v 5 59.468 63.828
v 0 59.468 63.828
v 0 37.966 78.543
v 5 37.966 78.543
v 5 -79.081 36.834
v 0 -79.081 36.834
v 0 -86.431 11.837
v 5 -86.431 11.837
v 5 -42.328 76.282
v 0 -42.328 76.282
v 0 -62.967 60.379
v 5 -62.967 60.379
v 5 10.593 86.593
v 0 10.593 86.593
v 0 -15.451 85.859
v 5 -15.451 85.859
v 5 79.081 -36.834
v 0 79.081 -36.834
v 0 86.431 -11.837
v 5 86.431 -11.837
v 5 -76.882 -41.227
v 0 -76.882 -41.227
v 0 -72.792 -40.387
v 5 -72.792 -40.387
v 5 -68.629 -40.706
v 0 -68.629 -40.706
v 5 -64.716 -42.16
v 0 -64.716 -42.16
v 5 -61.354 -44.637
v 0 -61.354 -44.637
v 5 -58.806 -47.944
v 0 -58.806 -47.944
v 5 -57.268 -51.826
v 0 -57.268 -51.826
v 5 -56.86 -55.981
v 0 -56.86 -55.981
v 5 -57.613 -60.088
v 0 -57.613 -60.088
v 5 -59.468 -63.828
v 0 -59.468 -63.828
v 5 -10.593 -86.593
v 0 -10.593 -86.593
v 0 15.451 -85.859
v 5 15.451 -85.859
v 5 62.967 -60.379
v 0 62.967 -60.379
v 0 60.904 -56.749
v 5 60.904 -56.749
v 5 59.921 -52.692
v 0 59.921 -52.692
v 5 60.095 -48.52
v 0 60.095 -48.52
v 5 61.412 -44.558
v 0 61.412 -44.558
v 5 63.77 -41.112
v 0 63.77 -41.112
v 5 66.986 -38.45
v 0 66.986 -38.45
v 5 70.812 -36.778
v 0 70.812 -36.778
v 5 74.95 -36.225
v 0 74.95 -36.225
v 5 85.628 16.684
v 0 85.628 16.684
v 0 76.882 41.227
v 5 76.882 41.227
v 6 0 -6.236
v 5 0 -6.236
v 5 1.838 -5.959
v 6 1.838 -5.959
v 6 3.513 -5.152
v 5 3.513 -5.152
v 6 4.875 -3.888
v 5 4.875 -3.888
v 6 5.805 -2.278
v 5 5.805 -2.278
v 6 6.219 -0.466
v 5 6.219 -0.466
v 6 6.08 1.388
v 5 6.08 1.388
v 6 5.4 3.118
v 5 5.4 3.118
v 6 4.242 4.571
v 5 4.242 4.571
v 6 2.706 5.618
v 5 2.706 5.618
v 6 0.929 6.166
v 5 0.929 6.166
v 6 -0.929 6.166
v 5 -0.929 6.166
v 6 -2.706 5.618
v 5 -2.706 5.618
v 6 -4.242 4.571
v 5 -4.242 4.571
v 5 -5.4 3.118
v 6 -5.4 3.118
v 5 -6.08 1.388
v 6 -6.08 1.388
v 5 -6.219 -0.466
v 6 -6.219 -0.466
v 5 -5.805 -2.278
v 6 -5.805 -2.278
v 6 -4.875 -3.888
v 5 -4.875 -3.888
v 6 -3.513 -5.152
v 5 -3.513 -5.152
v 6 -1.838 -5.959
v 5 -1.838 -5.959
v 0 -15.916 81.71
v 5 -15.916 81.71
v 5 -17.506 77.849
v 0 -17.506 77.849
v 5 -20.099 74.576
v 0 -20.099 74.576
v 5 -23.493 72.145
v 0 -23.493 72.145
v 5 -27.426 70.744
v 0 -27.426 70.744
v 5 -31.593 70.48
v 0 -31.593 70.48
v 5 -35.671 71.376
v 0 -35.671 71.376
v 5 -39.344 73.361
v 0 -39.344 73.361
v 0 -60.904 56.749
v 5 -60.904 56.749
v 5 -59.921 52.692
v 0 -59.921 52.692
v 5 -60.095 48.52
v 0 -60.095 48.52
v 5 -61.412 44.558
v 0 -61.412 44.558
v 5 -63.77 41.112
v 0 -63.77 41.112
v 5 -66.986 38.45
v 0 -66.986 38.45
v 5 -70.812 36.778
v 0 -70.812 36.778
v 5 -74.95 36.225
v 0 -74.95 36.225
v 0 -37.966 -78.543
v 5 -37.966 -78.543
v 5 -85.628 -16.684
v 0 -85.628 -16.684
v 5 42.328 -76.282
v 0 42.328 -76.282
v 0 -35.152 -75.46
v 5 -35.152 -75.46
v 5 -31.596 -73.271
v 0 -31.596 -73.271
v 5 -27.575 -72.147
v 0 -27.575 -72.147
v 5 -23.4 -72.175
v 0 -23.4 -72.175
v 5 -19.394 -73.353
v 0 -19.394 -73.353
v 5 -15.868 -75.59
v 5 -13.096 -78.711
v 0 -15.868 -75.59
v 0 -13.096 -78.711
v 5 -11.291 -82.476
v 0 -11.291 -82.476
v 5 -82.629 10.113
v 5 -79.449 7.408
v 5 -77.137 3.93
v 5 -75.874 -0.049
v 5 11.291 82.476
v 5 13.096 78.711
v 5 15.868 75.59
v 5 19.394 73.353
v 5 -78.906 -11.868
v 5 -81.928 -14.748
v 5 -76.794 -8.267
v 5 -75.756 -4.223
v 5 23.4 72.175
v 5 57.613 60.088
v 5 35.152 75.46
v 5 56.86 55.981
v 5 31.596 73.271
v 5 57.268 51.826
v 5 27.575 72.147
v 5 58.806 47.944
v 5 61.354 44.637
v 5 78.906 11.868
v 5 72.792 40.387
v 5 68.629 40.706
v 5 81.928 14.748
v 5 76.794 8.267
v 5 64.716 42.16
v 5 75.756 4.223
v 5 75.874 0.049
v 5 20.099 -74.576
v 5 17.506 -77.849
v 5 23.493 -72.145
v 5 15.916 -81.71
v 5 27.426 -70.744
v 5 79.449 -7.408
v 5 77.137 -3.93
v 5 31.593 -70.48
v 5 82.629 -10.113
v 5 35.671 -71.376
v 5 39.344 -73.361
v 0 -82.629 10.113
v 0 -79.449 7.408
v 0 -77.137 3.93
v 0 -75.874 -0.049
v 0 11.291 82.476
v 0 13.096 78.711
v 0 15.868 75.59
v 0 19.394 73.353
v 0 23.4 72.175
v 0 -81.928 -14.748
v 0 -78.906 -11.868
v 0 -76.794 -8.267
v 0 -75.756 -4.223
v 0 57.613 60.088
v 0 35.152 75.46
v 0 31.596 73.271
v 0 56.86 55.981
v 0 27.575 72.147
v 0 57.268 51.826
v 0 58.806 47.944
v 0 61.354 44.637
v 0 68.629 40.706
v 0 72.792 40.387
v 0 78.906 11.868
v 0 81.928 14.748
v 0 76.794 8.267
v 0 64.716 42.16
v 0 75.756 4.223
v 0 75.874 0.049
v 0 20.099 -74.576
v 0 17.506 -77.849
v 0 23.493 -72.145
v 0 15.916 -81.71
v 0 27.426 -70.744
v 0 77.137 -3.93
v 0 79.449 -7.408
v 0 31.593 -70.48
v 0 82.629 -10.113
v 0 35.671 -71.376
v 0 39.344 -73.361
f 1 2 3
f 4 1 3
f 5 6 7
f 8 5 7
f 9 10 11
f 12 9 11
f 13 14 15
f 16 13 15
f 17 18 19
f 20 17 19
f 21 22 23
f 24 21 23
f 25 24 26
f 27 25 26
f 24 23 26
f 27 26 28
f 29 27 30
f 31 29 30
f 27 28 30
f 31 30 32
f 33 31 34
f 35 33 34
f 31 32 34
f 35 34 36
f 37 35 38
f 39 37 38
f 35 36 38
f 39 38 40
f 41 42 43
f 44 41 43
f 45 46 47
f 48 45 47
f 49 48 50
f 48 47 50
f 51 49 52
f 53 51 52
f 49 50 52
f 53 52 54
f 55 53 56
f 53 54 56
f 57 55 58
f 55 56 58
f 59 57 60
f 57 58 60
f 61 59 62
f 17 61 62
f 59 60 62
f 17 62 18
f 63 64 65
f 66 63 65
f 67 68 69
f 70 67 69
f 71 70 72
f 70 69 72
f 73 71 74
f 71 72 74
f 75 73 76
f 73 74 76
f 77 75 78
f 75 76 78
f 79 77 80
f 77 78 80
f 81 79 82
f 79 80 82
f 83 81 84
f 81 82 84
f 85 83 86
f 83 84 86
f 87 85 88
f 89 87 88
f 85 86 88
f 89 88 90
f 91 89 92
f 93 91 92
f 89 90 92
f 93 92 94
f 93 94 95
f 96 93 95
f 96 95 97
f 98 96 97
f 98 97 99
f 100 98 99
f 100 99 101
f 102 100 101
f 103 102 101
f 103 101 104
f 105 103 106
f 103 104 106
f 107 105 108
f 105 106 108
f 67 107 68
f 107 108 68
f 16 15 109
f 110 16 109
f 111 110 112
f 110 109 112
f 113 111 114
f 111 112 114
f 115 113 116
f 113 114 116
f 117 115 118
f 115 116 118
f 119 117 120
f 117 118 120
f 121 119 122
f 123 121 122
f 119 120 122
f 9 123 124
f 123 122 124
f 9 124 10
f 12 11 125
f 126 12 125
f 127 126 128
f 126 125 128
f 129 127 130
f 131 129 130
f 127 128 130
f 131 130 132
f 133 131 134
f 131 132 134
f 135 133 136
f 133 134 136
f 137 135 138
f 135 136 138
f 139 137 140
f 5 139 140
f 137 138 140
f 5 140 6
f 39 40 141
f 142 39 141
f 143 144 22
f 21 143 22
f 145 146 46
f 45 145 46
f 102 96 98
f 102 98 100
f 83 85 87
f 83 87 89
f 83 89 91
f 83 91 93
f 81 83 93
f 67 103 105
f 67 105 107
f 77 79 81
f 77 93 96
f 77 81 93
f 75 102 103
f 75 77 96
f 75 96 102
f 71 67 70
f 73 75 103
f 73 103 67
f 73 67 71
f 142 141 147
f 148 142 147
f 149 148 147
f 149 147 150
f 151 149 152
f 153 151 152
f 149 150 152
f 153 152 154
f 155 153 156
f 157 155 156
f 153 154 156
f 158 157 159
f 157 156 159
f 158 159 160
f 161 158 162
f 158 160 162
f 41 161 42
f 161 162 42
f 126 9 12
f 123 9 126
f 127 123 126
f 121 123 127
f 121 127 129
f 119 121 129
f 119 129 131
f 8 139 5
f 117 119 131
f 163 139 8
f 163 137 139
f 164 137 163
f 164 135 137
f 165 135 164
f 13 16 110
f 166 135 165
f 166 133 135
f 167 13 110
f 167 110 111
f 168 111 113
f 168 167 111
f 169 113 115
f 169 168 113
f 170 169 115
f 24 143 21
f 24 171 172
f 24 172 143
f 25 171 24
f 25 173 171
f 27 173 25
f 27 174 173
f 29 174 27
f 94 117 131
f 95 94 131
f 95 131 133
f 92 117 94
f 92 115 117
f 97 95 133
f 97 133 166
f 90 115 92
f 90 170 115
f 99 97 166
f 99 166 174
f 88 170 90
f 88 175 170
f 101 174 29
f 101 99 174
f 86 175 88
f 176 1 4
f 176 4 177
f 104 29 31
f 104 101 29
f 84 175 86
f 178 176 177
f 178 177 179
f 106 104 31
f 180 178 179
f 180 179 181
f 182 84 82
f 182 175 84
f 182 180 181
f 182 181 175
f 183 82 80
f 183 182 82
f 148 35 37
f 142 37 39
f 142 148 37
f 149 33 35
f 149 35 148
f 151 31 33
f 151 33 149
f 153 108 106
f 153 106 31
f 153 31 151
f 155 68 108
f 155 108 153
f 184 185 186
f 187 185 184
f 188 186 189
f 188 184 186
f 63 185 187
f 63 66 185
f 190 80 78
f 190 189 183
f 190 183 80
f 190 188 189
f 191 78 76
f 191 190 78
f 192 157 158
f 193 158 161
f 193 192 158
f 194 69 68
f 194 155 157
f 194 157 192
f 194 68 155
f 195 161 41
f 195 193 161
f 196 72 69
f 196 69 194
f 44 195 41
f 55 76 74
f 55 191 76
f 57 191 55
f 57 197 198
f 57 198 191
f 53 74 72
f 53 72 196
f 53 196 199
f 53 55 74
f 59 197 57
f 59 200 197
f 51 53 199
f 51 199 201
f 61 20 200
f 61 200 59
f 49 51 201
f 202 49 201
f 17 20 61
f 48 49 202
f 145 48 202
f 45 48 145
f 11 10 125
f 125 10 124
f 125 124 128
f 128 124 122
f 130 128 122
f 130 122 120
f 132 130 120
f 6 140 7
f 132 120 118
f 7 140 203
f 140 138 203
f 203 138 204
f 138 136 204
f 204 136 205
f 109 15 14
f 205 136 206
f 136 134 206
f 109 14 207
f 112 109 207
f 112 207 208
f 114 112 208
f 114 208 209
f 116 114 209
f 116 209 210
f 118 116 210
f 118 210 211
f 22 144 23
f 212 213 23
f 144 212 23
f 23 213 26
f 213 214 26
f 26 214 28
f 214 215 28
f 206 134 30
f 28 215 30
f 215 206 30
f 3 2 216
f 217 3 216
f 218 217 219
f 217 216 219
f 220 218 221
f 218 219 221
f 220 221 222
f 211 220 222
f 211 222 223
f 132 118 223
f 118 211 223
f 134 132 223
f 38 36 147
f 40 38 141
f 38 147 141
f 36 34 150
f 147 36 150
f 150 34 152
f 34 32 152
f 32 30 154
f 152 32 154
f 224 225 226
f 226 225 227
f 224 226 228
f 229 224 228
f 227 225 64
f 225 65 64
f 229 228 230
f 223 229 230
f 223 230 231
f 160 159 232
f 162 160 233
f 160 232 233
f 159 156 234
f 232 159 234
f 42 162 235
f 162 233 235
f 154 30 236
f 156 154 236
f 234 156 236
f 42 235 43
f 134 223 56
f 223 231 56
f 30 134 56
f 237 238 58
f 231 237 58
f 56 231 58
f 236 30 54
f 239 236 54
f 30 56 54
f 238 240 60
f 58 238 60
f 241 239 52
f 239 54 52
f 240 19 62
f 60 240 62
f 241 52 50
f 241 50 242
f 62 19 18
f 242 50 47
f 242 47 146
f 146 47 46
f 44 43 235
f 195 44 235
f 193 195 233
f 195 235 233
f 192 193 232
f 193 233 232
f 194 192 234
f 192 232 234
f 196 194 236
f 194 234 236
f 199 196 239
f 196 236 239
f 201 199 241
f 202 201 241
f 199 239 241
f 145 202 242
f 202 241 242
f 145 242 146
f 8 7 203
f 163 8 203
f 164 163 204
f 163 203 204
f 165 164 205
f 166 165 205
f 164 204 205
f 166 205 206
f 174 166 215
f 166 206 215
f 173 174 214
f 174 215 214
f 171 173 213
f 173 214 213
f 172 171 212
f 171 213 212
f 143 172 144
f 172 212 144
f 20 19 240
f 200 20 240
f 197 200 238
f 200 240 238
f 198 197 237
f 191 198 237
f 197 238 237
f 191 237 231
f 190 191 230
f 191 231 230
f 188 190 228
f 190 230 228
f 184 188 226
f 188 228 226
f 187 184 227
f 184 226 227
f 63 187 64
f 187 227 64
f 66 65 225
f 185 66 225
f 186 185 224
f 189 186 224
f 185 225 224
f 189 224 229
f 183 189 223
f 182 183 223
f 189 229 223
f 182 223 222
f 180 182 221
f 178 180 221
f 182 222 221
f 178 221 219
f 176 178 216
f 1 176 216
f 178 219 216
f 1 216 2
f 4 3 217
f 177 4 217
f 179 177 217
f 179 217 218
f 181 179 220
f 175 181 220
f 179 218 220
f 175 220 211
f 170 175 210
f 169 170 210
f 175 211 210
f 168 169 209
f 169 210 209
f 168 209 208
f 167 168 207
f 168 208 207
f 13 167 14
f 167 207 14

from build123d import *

# Parameters (mm, degrees)
DODANIE_WYCI_GNI_CIE1_DEPTH = 5
SZKIC2_R                    = 6.235949903
DODANIE_WYCI_GNI_CIE2_DEPTH = 1


with BuildPart() as part:
    # Szkic1 → Dodanie-wyciągnięcie1 (new body)
    with BuildSketch(Plane(origin=(0, 0, 0), x_dir=(0, 0, -1), z_dir=(1, 0, 0))):
        with BuildLine():
            Line((16.683684026, -85.628014752), (41.227039969, -76.881944554))
            ThreePointArc((41.227039969, -76.881944554), (46.201703182, -59.964643396), (63.82826816, -59.468095705))
            Line((63.82826816, -59.468095705), (78.543449139, -37.966153615))
            ThreePointArc((78.543449139, -37.966153615), (72.624296091, -21.355735808), (86.5926233, -10.593385344))
            Line((86.5926233, -10.593385344), (85.858930332, 15.451417583))
            ThreePointArc((85.858930332, 15.451417583), (71.306876302, 25.410337004), (76.281539514, 42.327638162))
            Line((76.281539514, 42.327638162), (60.379218375, 62.967072438))
            ThreePointArc((60.379218375, 62.967072438), (42.752653397, 62.470524746), (36.833500348, 79.080942553))
            Line((36.833500348, 79.080942553), (11.836697213, 86.431445794))
            ThreePointArc((11.836697213, 86.431445794), (-2.131629996, 75.669095331), (-16.683684026, 85.628014752))
            Line((-16.683684026, 85.628014752), (-41.227039969, 76.881944554))
            ThreePointArc((-41.227039969, 76.881944554), (-46.201703182, 59.964643396), (-63.82826816, 59.468095705))
            Line((-63.82826816, 59.468095705), (-78.543449139, 37.966153615))
            ThreePointArc((-78.543449139, 37.966153615), (-72.624296091, 21.355735808), (-86.5926233, 10.593385344))
            Line((-86.5926233, 10.593385344), (-85.858930332, -15.451417583))
            ThreePointArc((-85.858930332, -15.451417583), (-71.306876302, -25.410337004), (-76.281539514, -42.327638162))
            Line((-76.281539514, -42.327638162), (-60.379218375, -62.967072438))
            ThreePointArc((-60.379218375, -62.967072438), (-42.752653397, -62.470524746), (-36.833500348, -79.080942553))
            Line((-36.833500348, -79.080942553), (-11.836697213, -86.431445794))
            ThreePointArc((-11.836697213, -86.431445794), (2.131629996, -75.669095331), (16.683684026, -85.628014752))
        make_face()
    extrude(amount=DODANIE_WYCI_GNI_CIE1_DEPTH)

    # Szkic2 → Dodanie-wyciągnięcie2 (add)
    with BuildSketch(Plane(origin=(5, 0, 0), x_dir=(0, 0, -1), z_dir=(1, 0, 0))):
        Circle(SZKIC2_R)
    extrude(amount=DODANIE_WYCI_GNI_CIE2_DEPTH)


solid = part.part
